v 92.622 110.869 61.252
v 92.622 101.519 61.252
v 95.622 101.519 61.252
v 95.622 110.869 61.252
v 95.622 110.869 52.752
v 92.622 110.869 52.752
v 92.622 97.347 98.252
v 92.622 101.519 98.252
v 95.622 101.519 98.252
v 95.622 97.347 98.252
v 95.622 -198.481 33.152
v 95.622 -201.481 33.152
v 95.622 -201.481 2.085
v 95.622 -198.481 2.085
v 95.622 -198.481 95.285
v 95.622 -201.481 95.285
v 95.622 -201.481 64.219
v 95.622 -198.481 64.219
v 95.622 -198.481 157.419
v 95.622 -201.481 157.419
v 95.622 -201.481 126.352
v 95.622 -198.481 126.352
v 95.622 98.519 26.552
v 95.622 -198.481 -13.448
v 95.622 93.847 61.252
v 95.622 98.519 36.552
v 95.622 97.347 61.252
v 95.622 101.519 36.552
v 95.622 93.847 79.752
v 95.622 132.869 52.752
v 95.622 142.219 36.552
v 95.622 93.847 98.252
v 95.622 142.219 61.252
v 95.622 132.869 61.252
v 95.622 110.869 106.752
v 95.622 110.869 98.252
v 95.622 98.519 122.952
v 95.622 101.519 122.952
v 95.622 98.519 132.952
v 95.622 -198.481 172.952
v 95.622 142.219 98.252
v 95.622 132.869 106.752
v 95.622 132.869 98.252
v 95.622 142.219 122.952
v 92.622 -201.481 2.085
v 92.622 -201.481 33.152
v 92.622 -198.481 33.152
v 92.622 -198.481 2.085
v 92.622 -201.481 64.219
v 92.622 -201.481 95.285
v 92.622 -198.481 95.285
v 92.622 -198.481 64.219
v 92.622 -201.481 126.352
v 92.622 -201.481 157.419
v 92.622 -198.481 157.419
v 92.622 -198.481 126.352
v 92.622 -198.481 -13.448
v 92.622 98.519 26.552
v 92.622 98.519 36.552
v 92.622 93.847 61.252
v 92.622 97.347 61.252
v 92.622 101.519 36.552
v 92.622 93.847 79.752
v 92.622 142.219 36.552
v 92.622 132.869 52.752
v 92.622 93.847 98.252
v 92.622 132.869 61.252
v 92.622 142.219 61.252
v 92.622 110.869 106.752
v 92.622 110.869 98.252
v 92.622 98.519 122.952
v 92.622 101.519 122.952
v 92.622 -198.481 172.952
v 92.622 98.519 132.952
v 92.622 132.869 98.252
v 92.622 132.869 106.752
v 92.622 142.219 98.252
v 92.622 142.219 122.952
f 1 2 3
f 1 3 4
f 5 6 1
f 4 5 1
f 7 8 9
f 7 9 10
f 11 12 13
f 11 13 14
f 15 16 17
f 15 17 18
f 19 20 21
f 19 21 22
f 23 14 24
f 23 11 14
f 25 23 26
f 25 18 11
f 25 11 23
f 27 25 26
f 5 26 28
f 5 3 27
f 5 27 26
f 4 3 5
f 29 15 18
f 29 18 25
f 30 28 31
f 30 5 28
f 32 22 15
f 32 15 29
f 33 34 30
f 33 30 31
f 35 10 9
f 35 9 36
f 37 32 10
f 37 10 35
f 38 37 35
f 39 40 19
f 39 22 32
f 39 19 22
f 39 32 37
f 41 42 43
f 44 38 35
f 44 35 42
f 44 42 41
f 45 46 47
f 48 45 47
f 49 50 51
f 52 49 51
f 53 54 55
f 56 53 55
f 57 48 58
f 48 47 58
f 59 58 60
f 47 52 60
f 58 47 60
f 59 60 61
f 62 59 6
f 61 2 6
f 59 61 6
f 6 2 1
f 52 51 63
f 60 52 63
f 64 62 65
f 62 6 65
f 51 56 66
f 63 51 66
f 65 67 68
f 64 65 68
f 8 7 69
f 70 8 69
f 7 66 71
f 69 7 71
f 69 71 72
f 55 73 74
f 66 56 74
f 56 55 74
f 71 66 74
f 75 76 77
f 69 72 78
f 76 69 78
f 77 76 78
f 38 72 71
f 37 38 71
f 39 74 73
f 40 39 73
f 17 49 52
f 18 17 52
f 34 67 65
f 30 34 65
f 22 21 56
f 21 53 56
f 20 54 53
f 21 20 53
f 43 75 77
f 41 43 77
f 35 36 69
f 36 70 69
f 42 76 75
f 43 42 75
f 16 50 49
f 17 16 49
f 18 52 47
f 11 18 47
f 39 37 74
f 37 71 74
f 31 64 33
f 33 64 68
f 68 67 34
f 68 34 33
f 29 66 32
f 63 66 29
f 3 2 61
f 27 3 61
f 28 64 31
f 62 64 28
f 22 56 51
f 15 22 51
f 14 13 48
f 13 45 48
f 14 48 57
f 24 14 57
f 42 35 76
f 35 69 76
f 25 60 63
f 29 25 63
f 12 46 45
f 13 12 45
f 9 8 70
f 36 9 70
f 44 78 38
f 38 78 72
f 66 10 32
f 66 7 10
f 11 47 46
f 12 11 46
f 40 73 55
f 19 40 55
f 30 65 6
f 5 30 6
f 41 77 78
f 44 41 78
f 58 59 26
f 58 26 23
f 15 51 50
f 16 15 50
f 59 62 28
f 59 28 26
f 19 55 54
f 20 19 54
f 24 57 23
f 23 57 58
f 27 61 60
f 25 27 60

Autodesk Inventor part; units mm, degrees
ref_plane "YZ Plane" through (0, 0, 0) normal (1, 0, 0) x (0, 1, 0)
ref_plane "XZ Plane" through (0, 0, 0) normal (0, 1, 0) x (-1, 0, 0)
ref_plane "XY Plane" through (0, 0, 0) normal (0, 0, 1) x (1, 0, 0)
ref_plane "Work Plane1" through (92.6217, 101.5189, 36.552) normal (1, 0, 0) x (0, 1, 0)
ref_plane "Work Plane2" through (89.5017, 946.6624, 79.752) normal (0, 0, 1) x (0.6133, 0.7899, 0)
sketch "Sketch1" plane through (92.6217, 101.5189, 36.552) normal (1, 0, 0) x (0, 1, 0)
  line L0 (31.35, 24.7) -> (31.35, 16.2) projected
  line L1 (31.35, 16.2) -> (9.35, 16.2) projected
  line L2 (9.35, 16.2) -> (9.35, 24.7) projected
  line L3 (0, 24.7) -> (9.35, 24.7) projected
  line L4 (0, 0) -> (0, 24.7) construction
  line L5 (40.7, 0) -> (0, 0) projected
  line L6 (40.7, 0) -> (40.7, 24.7) projected
  line L7 (31.35, 24.7) -> (40.7, 24.7) projected
  line L8 (9.35, 61.7) -> (9.35, 70.2) projected
  line L9 (9.35, 70.2) -> (31.35, 70.2) projected
  line L10 (31.35, 70.2) -> (31.35, 61.7) projected
  line L11 (31.35, 61.7) -> (40.7, 61.7) projected
  line L12 (40.7, 61.7) -> (40.7, 86.4) projected
  line L13 (40.7, 86.4) -> (0, 86.4) projected
  line L14 (0, 86.4) -> (0, 61.7) construction
  line L15 (0, 61.7) -> (9.35, 61.7) projected
  line L16 (-4.1716, 58.2) -> (44.8716, 58.2) projected
  line L17 (-4.1716, 28.2) -> (44.8716, 28.2) projected
  line L18 (-300, 136.4) -> (-300, 120.8667) projected
  line L19 (0, 61.7) -> (-4.1716, 61.7)
  line L20 (-4.1716, 61.7) -> (-7.6716, 61.7)
  line L21 (-7.6716, 61.7) -> (-7.6716, 43.2)
  line L22 (-4.1716, 58.2) -> (-4.1716, 61.7) construction
  line L23 (-372.5743, 43.2) -> (114.4459, 43.2) construction
  line L24 (0, 24.7) -> (-4.1716, 24.7)
  line L25 (-4.1716, 24.7) -> (-7.6716, 24.7)
  line L26 (-7.6716, 24.7) -> (-7.6716, 43.2)
  line L27 (0, 86.4) -> (-3, 86.4)
  line L28 (-3, 86.4) -> (-3, 96.4)
  line L29 (-3, 96.4) -> (-300, 136.4)
  line L30 (0, 0) -> (-3, 0)
  line L31 (-3, 0) -> (-3, -10)
  line L32 (-300, 120.8667) -> (-303, 120.8667) projected
  line L33 (-303, 120.8667) -> (-303, 89.8) projected
  line L34 (-303, 89.8) -> (-300, 89.8) projected
  line L35 (-300, 89.8) -> (-300, 58.7333) projected
  line L36 (-300, 58.7333) -> (-303, 58.7333) projected
  line L37 (-303, 58.7333) -> (-303, 27.6667) projected
  line L38 (-303, 27.6667) -> (-300, 27.6667) projected
  line L39 (-300, 27.6667) -> (-300, -3.4) projected
  line L40 (-300, -3.4) -> (-303, -3.4) projected
  line L41 (-303, -3.4) -> (-303, -34.4667) projected
  line L42 (-303, -34.4667) -> (-300, -34.4667) projected
  line L43 (-300, -34.4667) -> (-300, -50) projected
  line L44 (-300, -50) -> (-3, -10)
  point P0 (-101.5189, -36.552)
  dimension "d2" = 10
  dimension "d4" = 3
extrude "Extrusion1" add sketch "Sketch1" along normal blind 3
sketch "Sketch2" plane through (95.6217, 101.5189, 36.552) normal (1, 0, 0) x (0, 0, -1)
  line L0 (-24.7, 40.7) -> (-24.7, 31.35) projected
  line L1 (-24.7, 31.35) -> (-16.2, 31.35) projected
  line L2 (-16.2, 31.35) -> (-16.2, 9.35) projected
  line L3 (-16.2, 9.35) -> (-24.7, 9.35) projected
  line L4 (-24.7, 9.35) -> (-24.7, -7.6716) projected
  line L5 (-24.7, -7.6716) -> (-61.7, -7.6716) projected
  line L6 (-61.7, -7.6716) -> (-61.7, 9.35) projected
  line L7 (-61.7, 9.35) -> (-70.2, 9.35) projected
  line L8 (-70.2, 9.35) -> (-70.2, 31.35) projected
  line L9 (-70.2, 31.35) -> (-61.7, 31.35) projected
  line L10 (-61.7, 31.35) -> (-61.7, 40.7) projected
  line L11 (-61.7, 40.7) -> (-86.4, 40.7) projected
  line L12 (-86.4, 40.7) -> (-86.4, -3) projected
  line L13 (-86.4, -3) -> (-96.4, -3) projected
  line L14 (-96.4, -3) -> (-136.4, -300) projected
  line L15 (-136.4, -300) -> (-120.8667, -300) projected
  line L16 (-120.8667, -300) -> (-120.8667, -303) projected
  line L17 (-120.8667, -303) -> (-89.8, -303) projected
  line L18 (-89.8, -303) -> (-89.8, -300) projected
  line L19 (-89.8, -300) -> (-58.7333, -300) projected
  line L20 (-58.7333, -300) -> (-58.7333, -303) projected
  line L21 (-58.7333, -303) -> (-27.6667, -303) projected
  line L22 (-27.6667, -303) -> (-27.6667, -300) projected
  line L23 (-27.6667, -300) -> (3.4, -300) projected
  line L24 (3.4, -300) -> (3.4, -303) projected
  line L25 (3.4, -303) -> (34.4667, -303) projected
  line L26 (34.4667, -303) -> (34.4667, -300) projected
  line L27 (34.4667, -300) -> (50, -300) projected
  line L28 (50, -300) -> (10, -3) projected
  line L29 (10, -3) -> (0, -3) projected
  line L30 (0, -3) -> (0, 40.7) projected
  line L31 (0, 40.7) -> (-24.7, 40.7) projected
  point P0 (36.552, -101.5189)
properties part number "Stand 2" material "Wood (Oak)"
